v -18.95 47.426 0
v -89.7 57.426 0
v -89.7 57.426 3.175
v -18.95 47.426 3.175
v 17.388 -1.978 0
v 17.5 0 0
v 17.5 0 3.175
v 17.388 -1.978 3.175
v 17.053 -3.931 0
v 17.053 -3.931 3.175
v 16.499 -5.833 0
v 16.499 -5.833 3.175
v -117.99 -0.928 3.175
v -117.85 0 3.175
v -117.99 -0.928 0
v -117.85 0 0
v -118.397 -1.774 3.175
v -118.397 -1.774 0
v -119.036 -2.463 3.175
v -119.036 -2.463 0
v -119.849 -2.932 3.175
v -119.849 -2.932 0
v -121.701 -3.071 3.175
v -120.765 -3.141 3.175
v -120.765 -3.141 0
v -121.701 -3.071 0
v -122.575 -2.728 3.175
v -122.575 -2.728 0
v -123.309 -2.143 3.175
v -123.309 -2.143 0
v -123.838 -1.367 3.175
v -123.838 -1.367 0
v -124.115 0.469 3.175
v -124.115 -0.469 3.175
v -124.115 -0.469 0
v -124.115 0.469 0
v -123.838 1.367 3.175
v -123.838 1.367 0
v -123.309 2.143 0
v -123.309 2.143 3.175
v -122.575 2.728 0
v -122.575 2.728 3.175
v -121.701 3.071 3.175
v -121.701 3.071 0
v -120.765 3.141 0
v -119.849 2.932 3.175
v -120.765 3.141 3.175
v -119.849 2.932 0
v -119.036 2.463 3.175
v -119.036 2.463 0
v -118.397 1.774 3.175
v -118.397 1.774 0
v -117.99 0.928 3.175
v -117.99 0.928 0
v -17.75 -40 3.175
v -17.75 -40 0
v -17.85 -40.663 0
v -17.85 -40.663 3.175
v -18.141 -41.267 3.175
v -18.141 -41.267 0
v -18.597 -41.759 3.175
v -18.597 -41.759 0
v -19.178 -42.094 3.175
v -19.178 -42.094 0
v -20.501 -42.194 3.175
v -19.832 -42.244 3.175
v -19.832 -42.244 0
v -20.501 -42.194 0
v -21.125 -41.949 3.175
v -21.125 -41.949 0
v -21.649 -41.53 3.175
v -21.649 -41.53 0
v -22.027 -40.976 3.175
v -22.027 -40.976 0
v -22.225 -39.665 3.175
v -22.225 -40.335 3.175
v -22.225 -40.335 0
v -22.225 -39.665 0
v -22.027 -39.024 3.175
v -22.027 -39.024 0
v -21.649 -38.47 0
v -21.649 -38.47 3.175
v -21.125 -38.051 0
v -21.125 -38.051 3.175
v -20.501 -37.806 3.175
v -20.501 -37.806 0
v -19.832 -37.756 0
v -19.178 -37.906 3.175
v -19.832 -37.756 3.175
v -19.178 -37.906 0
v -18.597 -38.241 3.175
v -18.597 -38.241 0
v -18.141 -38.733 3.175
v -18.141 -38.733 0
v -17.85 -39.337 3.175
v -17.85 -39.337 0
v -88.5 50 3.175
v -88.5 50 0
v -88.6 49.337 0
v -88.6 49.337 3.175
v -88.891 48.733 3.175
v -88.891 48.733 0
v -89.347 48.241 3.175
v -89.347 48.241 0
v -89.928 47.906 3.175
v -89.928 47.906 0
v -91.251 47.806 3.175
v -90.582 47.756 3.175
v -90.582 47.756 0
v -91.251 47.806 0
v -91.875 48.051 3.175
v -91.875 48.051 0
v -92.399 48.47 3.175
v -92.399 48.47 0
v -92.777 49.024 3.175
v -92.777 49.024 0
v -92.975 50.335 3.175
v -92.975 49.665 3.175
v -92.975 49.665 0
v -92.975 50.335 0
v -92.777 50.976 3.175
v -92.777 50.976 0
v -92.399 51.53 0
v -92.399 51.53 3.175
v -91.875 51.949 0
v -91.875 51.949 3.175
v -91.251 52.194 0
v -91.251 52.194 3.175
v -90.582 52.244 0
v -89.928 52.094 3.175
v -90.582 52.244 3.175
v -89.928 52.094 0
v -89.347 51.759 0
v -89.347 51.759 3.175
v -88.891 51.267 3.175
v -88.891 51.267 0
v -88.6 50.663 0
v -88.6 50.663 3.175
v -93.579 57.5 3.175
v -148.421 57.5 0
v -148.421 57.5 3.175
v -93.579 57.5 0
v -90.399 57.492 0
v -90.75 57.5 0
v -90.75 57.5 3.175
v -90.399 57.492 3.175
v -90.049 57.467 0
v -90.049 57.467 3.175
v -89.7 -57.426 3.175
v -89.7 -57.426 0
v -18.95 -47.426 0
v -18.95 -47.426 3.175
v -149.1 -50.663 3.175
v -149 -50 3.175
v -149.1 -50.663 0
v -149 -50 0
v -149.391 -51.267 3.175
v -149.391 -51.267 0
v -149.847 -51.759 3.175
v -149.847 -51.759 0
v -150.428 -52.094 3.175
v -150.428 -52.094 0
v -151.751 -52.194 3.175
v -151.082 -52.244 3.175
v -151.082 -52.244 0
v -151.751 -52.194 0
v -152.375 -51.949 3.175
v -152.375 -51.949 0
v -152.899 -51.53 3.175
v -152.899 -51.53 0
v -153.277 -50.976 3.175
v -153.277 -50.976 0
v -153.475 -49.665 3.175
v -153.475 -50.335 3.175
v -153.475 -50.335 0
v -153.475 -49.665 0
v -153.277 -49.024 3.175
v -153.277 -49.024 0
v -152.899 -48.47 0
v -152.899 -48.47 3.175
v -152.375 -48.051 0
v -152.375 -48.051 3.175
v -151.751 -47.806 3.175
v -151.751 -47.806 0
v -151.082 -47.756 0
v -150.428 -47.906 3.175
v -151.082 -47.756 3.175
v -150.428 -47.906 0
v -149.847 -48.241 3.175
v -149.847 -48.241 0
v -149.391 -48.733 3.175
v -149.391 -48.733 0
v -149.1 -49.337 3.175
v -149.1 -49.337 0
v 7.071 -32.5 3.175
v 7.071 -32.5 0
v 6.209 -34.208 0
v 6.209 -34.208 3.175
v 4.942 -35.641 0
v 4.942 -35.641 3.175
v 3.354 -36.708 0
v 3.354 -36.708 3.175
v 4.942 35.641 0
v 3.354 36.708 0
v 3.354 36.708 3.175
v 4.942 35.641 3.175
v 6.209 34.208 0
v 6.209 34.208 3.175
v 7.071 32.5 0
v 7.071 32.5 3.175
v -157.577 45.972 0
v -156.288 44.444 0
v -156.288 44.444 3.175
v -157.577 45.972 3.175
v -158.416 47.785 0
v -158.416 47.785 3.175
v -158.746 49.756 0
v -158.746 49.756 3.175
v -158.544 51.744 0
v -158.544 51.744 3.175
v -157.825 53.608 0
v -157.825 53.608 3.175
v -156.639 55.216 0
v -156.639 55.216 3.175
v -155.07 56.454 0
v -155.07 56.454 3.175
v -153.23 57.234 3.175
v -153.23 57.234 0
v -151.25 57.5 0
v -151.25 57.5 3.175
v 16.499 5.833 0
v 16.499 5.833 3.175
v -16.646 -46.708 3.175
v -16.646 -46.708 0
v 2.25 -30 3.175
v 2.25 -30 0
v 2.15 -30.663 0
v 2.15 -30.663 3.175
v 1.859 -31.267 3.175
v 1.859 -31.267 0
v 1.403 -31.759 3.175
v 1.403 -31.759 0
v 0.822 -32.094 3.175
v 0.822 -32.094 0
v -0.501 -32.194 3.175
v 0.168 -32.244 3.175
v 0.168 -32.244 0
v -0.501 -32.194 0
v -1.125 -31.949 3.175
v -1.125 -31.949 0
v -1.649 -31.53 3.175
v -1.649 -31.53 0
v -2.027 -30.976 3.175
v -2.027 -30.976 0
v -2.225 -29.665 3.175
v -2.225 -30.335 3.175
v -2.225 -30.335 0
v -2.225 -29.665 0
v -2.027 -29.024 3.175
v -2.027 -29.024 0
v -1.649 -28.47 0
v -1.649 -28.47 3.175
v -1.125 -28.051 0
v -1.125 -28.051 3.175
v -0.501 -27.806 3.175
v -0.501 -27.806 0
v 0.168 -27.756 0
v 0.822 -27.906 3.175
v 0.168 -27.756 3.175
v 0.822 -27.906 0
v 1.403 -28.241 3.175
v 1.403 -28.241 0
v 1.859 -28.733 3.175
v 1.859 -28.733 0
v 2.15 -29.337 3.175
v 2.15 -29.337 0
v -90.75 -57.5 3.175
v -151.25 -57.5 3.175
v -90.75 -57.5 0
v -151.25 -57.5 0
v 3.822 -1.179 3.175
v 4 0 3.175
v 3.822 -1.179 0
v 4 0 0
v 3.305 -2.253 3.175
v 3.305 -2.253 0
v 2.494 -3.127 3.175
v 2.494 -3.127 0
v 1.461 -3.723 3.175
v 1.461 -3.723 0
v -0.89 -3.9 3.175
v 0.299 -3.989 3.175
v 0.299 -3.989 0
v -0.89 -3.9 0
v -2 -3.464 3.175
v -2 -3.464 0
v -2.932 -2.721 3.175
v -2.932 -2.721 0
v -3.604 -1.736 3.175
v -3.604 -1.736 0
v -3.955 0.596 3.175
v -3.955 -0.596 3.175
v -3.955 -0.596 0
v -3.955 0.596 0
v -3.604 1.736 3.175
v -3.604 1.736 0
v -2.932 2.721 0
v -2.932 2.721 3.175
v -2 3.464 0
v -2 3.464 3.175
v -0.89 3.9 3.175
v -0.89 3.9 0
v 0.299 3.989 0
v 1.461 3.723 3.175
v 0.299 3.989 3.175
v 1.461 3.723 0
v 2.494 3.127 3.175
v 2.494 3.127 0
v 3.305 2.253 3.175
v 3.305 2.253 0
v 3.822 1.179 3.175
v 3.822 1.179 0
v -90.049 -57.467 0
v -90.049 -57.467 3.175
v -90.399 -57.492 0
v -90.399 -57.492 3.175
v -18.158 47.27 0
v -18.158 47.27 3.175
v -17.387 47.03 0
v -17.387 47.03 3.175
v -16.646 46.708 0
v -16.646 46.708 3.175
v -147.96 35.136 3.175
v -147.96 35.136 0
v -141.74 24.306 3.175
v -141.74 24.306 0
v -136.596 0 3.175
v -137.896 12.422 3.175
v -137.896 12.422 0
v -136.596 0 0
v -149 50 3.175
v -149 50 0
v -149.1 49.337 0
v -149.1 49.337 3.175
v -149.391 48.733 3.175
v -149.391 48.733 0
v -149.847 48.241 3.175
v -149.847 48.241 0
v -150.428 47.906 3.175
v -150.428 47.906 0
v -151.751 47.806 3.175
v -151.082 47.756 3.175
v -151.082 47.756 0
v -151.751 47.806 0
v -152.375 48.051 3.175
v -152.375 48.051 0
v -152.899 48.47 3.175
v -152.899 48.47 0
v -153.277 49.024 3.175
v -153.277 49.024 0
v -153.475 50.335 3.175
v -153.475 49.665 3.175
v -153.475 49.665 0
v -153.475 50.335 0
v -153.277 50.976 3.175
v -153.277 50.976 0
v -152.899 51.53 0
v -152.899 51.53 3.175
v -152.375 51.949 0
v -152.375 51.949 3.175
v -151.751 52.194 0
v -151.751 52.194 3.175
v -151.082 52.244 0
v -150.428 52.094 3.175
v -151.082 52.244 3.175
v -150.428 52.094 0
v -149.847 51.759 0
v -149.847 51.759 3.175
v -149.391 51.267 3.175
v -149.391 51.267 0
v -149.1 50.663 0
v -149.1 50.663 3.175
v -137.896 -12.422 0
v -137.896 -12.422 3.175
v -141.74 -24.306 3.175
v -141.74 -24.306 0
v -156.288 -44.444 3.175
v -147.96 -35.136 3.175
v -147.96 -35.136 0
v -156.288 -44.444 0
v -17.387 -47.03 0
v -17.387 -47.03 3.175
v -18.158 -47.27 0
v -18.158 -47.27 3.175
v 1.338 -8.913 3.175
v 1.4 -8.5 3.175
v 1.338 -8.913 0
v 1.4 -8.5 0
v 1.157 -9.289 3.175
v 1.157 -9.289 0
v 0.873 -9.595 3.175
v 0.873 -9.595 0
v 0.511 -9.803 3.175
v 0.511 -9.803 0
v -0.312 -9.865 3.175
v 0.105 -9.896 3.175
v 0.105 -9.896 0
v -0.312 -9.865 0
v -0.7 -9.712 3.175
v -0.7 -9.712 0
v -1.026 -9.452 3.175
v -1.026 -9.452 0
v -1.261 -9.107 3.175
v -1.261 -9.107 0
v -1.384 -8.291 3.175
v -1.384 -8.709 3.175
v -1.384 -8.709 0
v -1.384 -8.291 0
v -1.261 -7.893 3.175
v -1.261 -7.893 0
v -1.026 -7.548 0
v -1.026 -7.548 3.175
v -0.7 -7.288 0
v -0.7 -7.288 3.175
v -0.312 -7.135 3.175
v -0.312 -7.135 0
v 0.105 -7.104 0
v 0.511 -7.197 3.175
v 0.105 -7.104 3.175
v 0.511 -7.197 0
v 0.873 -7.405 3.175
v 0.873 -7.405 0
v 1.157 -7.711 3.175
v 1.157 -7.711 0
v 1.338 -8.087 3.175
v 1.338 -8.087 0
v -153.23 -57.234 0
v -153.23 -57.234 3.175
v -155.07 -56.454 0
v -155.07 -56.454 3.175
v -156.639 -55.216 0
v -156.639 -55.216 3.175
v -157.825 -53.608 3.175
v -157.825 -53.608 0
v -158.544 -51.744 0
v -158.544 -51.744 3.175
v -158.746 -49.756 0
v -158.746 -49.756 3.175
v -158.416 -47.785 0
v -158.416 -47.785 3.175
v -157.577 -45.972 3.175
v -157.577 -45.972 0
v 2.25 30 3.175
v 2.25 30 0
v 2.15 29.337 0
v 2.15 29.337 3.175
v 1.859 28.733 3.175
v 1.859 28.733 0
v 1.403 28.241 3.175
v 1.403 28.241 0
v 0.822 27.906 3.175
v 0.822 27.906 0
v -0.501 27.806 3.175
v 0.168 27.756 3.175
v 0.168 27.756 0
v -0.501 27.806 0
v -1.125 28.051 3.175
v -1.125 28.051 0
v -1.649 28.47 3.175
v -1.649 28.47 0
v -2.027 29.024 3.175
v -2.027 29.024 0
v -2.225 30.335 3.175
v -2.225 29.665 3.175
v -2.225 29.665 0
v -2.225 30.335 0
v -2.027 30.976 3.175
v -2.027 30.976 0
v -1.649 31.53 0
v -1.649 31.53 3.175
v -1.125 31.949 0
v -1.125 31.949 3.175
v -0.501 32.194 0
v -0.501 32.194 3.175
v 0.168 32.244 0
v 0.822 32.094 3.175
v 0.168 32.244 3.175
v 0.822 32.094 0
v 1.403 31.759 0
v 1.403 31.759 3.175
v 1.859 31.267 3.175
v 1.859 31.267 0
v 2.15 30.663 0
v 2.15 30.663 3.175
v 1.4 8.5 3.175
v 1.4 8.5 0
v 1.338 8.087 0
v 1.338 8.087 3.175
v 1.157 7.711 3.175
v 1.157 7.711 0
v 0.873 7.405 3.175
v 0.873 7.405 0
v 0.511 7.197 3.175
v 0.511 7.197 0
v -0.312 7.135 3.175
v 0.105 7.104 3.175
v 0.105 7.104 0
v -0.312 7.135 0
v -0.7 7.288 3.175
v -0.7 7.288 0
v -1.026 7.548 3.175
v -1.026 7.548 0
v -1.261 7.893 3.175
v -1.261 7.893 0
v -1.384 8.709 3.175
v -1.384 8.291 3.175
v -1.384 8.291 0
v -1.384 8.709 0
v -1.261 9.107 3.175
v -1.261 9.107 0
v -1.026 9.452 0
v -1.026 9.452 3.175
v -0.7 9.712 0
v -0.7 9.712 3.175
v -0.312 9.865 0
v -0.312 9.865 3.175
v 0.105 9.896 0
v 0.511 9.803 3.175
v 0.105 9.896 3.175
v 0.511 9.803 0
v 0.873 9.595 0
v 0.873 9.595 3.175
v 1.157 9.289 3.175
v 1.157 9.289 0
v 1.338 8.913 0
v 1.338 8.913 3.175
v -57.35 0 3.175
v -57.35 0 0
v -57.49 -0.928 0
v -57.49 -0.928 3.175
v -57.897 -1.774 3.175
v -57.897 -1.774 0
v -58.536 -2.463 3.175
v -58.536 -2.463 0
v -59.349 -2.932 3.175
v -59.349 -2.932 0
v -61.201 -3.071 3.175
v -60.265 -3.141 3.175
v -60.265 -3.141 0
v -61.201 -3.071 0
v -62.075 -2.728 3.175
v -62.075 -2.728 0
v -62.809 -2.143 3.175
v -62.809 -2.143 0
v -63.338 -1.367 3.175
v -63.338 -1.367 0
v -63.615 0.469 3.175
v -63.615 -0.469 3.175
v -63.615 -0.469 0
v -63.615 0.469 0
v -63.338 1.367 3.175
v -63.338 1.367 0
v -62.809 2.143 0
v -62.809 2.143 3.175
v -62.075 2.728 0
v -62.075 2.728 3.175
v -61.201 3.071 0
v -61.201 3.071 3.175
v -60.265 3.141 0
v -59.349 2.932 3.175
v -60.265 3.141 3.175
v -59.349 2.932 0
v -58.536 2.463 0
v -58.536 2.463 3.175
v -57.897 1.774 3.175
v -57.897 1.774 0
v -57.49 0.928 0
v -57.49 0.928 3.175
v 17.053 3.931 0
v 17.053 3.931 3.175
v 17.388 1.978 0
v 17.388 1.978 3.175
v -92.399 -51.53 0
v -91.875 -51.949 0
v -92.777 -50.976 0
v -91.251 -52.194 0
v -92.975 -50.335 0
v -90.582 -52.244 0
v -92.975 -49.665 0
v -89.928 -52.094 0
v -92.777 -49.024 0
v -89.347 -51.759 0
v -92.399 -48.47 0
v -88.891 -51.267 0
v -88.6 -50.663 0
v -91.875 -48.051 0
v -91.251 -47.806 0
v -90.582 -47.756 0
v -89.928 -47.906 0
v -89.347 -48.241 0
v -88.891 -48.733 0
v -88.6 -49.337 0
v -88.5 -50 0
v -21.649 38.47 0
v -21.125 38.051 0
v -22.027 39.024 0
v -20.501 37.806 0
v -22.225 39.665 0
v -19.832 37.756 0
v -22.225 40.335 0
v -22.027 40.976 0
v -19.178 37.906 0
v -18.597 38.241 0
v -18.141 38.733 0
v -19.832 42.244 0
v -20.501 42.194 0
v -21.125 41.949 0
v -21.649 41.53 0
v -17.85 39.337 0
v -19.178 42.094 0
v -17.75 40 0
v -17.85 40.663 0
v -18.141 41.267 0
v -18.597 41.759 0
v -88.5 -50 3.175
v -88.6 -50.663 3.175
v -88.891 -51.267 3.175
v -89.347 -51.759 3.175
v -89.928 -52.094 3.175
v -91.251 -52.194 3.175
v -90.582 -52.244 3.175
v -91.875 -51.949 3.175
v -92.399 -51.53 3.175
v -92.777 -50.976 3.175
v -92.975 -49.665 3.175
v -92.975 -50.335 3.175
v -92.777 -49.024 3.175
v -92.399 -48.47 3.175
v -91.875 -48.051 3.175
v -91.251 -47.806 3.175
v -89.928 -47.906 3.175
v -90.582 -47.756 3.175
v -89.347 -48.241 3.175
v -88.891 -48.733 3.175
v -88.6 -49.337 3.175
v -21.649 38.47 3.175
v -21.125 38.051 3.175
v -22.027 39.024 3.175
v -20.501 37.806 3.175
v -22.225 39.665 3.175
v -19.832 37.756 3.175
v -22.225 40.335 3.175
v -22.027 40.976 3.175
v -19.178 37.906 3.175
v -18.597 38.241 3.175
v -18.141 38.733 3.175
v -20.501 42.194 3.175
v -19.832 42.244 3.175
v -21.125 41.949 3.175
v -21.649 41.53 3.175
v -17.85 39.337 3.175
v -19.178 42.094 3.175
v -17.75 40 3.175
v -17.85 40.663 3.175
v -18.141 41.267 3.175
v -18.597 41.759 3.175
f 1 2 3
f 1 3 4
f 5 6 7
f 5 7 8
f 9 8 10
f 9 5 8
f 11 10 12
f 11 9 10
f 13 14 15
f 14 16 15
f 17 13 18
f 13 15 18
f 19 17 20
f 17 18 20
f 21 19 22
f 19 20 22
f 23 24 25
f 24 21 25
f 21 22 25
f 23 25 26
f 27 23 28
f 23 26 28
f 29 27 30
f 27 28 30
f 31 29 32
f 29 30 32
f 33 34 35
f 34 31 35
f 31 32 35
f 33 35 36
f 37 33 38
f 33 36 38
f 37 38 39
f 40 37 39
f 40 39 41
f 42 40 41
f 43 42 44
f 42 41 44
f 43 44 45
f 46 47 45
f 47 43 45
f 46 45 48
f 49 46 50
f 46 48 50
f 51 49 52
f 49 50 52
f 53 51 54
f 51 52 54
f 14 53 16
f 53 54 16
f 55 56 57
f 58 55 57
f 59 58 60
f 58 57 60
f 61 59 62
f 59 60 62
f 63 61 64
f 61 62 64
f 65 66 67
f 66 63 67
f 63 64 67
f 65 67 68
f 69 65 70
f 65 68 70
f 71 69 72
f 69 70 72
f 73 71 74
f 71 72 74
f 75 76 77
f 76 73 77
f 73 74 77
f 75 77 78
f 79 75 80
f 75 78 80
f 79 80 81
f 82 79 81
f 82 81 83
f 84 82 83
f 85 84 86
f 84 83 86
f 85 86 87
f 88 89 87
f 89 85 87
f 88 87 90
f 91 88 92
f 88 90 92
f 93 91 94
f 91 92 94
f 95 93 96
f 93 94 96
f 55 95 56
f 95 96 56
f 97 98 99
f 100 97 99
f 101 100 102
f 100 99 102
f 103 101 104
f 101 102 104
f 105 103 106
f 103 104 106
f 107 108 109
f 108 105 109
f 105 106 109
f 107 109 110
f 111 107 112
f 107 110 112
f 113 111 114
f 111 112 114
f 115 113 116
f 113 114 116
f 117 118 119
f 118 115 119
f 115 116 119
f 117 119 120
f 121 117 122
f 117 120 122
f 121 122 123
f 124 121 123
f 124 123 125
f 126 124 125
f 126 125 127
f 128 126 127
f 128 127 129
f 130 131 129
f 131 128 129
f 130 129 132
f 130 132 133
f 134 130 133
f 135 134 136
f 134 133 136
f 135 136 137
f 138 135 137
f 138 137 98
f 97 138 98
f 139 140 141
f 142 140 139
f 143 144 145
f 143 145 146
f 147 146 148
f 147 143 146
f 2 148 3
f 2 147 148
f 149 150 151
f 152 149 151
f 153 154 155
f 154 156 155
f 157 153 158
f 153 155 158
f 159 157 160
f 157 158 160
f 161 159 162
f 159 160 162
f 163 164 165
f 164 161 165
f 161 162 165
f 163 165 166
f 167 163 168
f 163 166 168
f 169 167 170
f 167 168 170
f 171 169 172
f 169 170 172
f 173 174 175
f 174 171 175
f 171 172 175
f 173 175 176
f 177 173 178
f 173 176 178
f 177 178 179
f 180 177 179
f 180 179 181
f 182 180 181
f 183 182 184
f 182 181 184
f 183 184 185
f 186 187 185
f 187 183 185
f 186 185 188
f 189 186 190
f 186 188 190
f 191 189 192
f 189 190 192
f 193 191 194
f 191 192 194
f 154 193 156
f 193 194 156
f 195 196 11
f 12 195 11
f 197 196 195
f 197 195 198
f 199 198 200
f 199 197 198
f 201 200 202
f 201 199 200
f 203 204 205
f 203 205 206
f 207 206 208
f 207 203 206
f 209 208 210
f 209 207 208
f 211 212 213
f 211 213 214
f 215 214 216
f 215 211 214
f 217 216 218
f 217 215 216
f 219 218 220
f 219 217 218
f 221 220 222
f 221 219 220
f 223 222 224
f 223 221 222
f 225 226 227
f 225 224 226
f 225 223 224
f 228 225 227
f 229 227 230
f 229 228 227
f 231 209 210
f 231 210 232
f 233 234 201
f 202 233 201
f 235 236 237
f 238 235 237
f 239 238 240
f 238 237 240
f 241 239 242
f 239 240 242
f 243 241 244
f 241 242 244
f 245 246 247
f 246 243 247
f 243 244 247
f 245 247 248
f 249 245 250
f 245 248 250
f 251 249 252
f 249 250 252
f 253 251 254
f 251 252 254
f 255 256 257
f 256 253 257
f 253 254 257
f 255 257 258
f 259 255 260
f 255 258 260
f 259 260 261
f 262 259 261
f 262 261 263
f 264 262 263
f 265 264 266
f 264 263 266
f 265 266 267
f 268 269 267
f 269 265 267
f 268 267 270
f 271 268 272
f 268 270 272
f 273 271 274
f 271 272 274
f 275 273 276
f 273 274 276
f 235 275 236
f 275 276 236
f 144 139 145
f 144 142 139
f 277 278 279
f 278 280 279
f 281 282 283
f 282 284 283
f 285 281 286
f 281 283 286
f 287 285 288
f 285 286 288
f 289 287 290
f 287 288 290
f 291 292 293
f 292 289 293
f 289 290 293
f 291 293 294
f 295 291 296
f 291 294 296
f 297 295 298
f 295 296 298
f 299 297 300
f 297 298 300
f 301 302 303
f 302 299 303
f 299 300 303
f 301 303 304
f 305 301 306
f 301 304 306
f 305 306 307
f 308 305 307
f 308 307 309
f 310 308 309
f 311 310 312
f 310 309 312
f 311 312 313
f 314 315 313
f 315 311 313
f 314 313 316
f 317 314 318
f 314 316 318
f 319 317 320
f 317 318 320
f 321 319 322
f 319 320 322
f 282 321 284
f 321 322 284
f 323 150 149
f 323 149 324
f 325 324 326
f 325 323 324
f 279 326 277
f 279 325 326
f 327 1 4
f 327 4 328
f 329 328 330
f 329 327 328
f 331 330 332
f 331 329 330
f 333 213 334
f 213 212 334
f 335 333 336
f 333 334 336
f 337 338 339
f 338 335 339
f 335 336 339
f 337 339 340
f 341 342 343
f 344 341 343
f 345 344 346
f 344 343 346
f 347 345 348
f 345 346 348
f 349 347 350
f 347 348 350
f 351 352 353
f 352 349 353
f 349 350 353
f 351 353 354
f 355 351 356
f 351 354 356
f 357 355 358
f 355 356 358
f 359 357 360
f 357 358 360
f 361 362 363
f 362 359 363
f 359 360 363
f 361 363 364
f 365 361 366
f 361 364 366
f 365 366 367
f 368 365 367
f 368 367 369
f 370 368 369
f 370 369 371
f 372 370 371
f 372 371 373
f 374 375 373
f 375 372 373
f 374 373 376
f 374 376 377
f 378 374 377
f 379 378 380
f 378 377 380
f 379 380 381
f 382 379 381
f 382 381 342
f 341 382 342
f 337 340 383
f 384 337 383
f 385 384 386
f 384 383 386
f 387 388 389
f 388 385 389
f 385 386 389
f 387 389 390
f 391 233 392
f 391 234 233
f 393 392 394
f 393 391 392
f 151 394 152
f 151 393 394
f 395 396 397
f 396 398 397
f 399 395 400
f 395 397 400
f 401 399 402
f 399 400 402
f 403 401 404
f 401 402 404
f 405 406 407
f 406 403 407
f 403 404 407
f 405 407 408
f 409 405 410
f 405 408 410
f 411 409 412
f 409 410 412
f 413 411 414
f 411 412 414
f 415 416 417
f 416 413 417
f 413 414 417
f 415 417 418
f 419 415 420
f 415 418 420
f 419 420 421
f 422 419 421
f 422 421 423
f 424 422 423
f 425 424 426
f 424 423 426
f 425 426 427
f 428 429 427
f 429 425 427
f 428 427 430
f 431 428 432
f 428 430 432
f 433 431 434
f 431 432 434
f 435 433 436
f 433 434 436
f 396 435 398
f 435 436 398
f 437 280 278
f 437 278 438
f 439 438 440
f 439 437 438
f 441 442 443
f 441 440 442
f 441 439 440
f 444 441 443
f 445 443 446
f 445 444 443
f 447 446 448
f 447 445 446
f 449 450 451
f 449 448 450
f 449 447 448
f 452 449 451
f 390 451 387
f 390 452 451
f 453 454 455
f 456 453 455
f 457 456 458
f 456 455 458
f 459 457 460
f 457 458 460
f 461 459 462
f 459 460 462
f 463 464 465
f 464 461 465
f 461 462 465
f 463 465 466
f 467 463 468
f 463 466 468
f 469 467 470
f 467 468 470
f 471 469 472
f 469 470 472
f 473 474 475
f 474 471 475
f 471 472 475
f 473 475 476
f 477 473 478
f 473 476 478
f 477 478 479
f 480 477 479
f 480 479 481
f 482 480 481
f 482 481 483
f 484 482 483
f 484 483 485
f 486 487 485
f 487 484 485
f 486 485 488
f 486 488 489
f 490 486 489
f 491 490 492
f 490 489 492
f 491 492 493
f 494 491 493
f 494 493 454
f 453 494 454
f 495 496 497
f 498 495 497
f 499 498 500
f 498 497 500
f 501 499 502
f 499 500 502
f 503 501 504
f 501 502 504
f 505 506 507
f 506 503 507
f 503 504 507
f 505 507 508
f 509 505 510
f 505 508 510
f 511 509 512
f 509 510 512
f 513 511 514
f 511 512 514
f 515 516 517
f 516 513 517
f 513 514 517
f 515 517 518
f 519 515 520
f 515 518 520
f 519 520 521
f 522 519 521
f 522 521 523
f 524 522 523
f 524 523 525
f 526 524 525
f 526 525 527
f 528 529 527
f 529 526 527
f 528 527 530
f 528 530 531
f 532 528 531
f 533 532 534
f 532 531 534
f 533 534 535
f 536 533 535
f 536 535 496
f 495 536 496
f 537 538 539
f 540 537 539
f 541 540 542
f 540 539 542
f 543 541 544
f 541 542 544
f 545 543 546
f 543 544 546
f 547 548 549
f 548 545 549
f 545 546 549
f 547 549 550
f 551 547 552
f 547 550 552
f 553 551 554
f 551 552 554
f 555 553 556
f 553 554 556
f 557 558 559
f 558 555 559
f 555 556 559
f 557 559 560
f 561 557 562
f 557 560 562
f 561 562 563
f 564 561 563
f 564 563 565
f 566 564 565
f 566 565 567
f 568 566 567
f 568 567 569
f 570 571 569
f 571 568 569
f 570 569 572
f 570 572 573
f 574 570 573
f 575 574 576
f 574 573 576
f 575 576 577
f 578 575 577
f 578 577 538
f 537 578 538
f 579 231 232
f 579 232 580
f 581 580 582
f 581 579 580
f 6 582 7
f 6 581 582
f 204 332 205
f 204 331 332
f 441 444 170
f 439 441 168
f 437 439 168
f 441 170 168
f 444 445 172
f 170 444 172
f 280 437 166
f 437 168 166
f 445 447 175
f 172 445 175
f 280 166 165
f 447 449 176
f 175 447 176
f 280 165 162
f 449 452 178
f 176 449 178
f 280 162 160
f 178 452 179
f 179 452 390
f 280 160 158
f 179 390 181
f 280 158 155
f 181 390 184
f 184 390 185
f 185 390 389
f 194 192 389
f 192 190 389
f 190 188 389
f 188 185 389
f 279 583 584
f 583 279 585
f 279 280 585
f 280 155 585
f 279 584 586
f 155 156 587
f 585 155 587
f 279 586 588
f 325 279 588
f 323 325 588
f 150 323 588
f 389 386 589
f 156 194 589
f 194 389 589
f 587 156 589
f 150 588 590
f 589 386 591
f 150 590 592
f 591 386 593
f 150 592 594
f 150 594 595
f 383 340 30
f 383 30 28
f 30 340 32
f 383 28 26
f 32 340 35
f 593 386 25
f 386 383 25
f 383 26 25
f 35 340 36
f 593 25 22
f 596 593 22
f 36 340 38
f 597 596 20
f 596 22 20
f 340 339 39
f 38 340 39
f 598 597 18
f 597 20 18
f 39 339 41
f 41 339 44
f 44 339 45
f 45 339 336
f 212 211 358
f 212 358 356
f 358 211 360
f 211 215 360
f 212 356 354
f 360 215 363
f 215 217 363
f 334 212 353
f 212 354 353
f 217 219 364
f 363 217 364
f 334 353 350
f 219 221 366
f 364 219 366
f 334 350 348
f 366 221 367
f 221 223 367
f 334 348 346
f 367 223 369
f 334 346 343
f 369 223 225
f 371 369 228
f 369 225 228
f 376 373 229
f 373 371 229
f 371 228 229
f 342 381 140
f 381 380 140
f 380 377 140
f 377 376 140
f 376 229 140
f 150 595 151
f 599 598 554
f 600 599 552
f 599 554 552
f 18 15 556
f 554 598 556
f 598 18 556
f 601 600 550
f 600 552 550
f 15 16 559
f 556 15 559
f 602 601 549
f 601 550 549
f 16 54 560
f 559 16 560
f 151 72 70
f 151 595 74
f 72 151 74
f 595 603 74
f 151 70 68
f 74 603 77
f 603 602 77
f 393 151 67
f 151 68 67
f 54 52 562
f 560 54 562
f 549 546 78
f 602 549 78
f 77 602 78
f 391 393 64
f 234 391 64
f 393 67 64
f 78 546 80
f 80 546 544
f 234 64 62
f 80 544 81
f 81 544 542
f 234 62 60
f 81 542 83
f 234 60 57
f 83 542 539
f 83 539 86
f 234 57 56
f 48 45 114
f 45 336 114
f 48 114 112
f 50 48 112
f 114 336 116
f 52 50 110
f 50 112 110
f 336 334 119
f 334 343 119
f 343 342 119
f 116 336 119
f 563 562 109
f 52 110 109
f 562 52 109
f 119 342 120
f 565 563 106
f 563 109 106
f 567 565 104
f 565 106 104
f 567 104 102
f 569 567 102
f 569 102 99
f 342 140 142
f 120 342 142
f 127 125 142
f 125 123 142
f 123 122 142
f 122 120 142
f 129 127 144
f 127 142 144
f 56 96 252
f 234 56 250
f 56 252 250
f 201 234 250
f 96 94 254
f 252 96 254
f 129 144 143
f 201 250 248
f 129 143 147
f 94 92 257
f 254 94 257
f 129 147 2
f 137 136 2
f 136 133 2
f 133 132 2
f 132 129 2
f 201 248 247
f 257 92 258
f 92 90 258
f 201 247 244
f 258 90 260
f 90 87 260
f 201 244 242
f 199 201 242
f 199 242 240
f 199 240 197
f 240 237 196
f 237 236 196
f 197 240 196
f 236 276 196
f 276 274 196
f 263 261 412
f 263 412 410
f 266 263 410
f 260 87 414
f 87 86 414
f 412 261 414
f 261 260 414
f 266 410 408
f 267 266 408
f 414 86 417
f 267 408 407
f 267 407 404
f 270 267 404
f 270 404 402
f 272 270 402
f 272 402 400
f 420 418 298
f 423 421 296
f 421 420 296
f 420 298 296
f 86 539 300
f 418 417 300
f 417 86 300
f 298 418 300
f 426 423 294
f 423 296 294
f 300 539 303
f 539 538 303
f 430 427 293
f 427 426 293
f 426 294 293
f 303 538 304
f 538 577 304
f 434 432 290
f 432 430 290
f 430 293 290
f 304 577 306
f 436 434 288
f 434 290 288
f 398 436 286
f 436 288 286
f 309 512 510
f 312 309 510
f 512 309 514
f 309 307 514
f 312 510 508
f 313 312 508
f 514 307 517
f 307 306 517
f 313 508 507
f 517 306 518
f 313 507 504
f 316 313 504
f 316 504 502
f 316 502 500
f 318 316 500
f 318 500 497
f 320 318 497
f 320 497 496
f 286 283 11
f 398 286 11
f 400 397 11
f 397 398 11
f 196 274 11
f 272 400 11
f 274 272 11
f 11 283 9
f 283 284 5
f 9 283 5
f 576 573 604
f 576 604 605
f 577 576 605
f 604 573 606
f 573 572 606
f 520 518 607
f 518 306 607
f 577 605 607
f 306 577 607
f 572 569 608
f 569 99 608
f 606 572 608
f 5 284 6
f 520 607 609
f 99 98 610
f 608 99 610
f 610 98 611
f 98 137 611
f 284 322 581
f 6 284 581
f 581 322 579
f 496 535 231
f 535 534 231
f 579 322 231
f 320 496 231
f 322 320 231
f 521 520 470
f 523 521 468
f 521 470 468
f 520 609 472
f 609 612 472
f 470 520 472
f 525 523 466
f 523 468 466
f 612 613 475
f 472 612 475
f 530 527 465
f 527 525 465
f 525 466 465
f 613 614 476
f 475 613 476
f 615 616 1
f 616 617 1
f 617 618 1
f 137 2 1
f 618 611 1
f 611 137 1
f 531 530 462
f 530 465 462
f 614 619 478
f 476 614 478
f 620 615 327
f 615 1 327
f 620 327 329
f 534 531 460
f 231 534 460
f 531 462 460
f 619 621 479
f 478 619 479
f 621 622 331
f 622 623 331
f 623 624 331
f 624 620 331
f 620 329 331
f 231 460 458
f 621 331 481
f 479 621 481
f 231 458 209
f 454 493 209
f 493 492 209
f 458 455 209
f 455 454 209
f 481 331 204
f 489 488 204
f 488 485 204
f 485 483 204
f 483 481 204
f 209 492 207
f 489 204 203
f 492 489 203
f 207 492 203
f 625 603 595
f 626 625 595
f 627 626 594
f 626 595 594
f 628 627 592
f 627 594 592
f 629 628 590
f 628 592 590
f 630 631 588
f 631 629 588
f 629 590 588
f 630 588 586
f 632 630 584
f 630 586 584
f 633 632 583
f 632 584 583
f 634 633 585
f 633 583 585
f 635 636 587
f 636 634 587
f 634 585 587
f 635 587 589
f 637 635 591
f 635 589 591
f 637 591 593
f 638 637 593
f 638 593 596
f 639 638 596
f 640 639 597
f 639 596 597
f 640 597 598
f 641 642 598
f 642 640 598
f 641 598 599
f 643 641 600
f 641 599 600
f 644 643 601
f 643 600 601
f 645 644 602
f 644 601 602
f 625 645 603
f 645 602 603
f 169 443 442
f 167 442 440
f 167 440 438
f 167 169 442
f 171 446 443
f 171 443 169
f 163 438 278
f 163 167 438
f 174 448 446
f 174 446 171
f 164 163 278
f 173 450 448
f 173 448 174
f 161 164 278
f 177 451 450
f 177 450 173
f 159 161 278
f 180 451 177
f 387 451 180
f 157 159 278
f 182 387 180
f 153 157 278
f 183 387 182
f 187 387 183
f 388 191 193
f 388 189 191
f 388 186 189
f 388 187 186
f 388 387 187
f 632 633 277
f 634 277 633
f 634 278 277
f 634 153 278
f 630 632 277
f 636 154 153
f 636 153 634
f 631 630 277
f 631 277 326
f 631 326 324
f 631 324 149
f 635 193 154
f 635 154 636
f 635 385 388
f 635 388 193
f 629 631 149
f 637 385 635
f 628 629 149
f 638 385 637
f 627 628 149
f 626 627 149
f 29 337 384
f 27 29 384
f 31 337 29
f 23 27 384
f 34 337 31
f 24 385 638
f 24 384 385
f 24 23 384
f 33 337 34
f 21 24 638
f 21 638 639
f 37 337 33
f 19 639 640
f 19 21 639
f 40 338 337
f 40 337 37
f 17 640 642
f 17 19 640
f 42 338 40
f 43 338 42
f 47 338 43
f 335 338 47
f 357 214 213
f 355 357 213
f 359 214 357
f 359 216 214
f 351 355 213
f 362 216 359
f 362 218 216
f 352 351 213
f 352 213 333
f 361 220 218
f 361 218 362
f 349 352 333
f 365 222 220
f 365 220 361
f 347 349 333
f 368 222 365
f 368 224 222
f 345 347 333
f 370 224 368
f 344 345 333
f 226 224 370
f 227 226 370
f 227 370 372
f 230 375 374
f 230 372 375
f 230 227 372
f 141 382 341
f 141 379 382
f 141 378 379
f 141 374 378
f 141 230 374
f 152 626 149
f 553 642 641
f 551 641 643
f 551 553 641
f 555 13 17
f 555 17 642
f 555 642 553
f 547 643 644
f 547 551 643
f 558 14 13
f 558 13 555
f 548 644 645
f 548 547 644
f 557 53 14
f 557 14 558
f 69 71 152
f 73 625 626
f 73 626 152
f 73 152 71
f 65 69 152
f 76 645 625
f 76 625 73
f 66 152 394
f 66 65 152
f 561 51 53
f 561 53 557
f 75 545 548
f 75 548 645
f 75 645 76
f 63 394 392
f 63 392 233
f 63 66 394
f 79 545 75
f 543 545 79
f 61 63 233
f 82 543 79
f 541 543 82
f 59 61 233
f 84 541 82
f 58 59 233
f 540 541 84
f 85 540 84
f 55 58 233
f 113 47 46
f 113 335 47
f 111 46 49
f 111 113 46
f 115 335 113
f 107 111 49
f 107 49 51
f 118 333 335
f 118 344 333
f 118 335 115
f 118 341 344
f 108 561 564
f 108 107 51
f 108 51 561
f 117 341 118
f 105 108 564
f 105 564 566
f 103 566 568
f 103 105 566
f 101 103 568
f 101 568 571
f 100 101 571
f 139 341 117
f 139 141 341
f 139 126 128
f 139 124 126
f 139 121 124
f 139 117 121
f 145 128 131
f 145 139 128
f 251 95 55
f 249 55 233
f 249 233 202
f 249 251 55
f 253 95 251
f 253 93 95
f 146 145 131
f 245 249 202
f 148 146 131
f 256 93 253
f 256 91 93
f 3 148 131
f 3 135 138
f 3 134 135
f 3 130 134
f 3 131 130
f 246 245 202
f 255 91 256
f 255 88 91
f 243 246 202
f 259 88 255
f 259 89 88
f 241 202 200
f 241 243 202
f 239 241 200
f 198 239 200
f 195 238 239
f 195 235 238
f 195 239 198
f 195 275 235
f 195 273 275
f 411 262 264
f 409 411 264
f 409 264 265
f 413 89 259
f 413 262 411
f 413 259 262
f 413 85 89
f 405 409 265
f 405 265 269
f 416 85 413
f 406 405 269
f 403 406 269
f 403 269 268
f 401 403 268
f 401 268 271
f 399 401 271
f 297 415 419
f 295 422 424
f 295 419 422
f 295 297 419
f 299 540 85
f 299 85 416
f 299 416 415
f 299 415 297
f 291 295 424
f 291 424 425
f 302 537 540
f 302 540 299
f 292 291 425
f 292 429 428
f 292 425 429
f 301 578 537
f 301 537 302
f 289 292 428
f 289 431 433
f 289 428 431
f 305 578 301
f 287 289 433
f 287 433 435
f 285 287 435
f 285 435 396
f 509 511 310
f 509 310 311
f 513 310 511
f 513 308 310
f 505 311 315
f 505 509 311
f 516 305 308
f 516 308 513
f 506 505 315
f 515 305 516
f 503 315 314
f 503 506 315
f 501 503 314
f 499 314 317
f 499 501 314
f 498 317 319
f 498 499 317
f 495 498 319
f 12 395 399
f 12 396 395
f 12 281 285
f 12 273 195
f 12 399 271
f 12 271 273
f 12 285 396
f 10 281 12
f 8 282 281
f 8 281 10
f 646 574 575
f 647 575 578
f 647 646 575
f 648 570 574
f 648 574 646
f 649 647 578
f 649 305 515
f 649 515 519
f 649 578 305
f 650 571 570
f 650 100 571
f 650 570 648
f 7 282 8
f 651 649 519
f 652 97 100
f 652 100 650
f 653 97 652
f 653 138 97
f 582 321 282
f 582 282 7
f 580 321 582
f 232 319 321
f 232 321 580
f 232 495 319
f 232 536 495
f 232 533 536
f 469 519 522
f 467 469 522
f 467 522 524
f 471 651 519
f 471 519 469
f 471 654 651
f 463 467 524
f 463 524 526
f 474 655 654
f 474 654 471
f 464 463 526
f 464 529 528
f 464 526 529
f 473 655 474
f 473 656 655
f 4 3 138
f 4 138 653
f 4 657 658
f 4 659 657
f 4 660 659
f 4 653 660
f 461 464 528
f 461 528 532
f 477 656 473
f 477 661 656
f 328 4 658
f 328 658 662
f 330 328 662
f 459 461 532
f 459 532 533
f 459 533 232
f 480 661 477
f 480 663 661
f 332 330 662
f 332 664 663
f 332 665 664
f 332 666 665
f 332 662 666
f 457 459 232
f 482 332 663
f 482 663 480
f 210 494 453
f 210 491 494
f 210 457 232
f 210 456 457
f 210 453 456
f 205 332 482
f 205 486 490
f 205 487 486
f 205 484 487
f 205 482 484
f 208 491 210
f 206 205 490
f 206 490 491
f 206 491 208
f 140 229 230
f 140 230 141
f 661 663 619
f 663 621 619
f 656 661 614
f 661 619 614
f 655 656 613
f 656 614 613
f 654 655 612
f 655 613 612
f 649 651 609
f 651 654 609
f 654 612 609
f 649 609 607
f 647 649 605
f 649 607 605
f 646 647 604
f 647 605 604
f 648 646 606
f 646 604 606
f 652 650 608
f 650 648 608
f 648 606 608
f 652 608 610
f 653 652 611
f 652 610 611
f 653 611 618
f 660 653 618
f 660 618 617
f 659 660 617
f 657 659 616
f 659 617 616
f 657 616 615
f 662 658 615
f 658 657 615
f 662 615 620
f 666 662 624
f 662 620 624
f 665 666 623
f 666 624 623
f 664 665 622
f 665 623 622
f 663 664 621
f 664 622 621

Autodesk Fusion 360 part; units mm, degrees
sketch "Sketch1" plane through (0, 0, 0) normal (0, 0, 1) x (1, 0, 0)
  circle A0 centre (0, 0) radius 4
  line L0 (0, 0) -> (-60.5, 0) construction
  line L1 (-60.5, 0) -> (-121, 0) construction
  circle A1 centre (-60.5, 0) radius 3.15
  circle A2 centre (-121, 0) radius 3.15
  circle A3 centre (-60.5, 0) radius 47 construction
  circle A4 centre (-121, 0) radius 47 construction
  circle A5 centre (0, 0) radius 17.5
  circle A6 centre (-60.5, 0) radius 17 construction
  circle A7 centre (0, 0) radius 12.5 construction
  circle A8 centre (0, 30) radius 2.25
  circle A9 centre (0, -30) radius 2.25
  circle A10 centre (0, 30) radius 6 construction
  circle A11 centre (0, -30) radius 6 construction
  line L2 (-90.75, 0) -> (-90.75, 50) construction
  circle A12 centre (-90.75, 50) radius 7.5
  circle A13 centre (-90.75, 50) radius 2.25
  line L3 (-90.75, 0) -> (-90.75, -50) construction
  circle A14 centre (-90.75, -50) radius 7.5
  circle A15 centre (-90.75, -50) radius 2.25
  line L4 (-121, 0) -> (-151.25, 0) construction
  line L5 (-151.25, 0) -> (-151.25, 50) construction
  circle A16 centre (-151.25, 50) radius 7.5
  circle A17 centre (-151.25, 50) radius 2.25
  line L6 (-151.25, 0) -> (-151.25, -50) construction
  circle A18 centre (-151.25, -50) radius 7.5
  circle A19 centre (-151.25, -50) radius 2.25
  circle A20 centre (-20, 40) radius 7.5
  line L7 (-20, 40) -> (-20, 0) construction
  line L8 (-20, 0) -> (-20, -40) construction
  circle A21 centre (-20, -40) radius 7.5
  circle A22 centre (-20, -40) radius 2.25
  circle A23 centre (-20, 40) radius 2.25
  line L9 (-89.7004, -57.4262) -> (-18.9504, -47.4262)
  circle A24 centre (0, -30) radius 7.5
  circle A25 centre (0, 30) radius 7.5
  line L10 (-89.7004, 57.4262) -> (-18.9504, 47.4262)
  circle A26 centre (-196.5959, 0) radius 60
  line L11 (-16.6459, 46.7082) -> (3.3541, 36.7082)
  line L12 (7.0711, 32.5) -> (16.4992, 5.8333)
  line L13 (7.0711, -32.5) -> (16.4992, -5.8333)
  line L14 (-16.6459, -46.7082) -> (3.3541, -36.7082)
  circle A27 centre (-121, 86.6222) radius 40
  line L15 (-151.25, -57.5) -> (-90.75, -57.5)
  line L16 (-160.1233, -61.9813) -> (16.4992, -61.9813) construction
  circle A28 centre (0, 0) radius 8.5 construction
  circle A29 centre (0, 8.5) radius 1.4
  circle A30 centre (0, -8.5) radius 1.4
  line L17 (-151.25, 57.5) -> (-90.75, 57.5)
  dimension "d1" = 8
  dimension "d2" = 60.5
  dimension "d4" = 60.5
  dimension "d6" = 6.3
  dimension "d7" = 6.3
  dimension "d8" = 94
  dimension "d9" = 94
  dimension "d10" = 35
  dimension "d11" = 34
  dimension "d12" = 25
  dimension "d13" = 4.5
  dimension "d14" = 4.5
  dimension "d15" = 60
  dimension "d16" = 12
  dimension "d17" = 12
  dimension "d18" = 15
  dimension "d19" = 50
  dimension "d20" = 4.5
  dimension "d21" = 15
  dimension "d22" = 4.5
  dimension "d23" = 30.25
  dimension "d24" = 15
  dimension "d25" = 4.5
  dimension "d26" = 15
  dimension "d27" = 4.5
  dimension "d28" = 15
  dimension "d29" = 40
  dimension "d30" = 20
  dimension "d31" = 15
  dimension "d32" = 4.5
  dimension "d33" = 4.5
  dimension "d34" = 15
  dimension "d35" = 15
  dimension "d36" = 120
  dimension "d37" = 80
  dimension "d44" = 17
  dimension "d45" = 2.8
  dimension "d46" = 2.8
extrude "Extrude1" add sketch "Sketch1" along normal blind 3.175 contours A5 | A5 A12 A14 A16 A18 A20 A21 L9 A24 A25 L10 A26 L11 L12 L13 L14 A27 L15 | A25 | A24 | A20 | A21 | A12 | A14 | A12 A27 L17 | A27 L17 | A18 | A16 | A16 A27 L17 picked at (-127.9955, 54.7116)
ref_plane "WorkPlane1" through (-70.7689, 0, 3.175) normal (0, 0, 1) x (1, 0, 0)
sketch "Sketch2" plane through (0, 0, 3.175) normal (0, 0, 1) x (1, 0, 0)
  circle A0 centre (-90.75, -50) radius 2.25
  circle A1 centre (0, 30) radius 2.25
  circle A2 centre (-151.25, -50) radius 2.25
  circle A3 centre (0, -30) radius 2.25
  circle A4 centre (0, 0) radius 4
  circle A5 centre (0, 8.5) radius 1.4
  circle A6 centre (0, -8.5) radius 1.4
  circle A7 centre (-20, -40) radius 2.25
  circle A8 centre (-90.75, 50) radius 2.25
  circle A9 centre (-20, 40) radius 2.25
  circle A10 centre (-151.25, 50) radius 2.25
  circle A11 centre (-60.5, 0) radius 3.15
  circle A12 centre (-121, 0) radius 3.15
  line L0 (-151.25, -57.5) -> (-90.75, -57.5)
  arc A13 (-156.2884, -44.4444) -> (-151.25, -57.5) centre (-151.25, -50) ccw
  arc A14 (-156.2884, -44.4444) -> (-156.2884, 44.4444) centre (-196.5959, 0) ccw
  arc A15 (-151.25, 57.5) -> (-156.2884, 44.4444) centre (-151.25, 50) ccw
  line L1 (-151.25, 57.5) -> (-90.75, 57.5)
  arc A16 (-89.7004, 57.4262) -> (-90.75, 57.5) centre (-90.75, 50) ccw
  line L2 (-89.7004, 57.4262) -> (-18.9504, 47.4262)
  arc A17 (-16.6459, 46.7082) -> (-18.9504, 47.4262) centre (-20, 40) ccw
  line L3 (-16.6459, 46.7082) -> (3.3541, 36.7082)
  arc A18 (7.0711, 32.5) -> (3.3541, 36.7082) centre (0, 30) ccw
  line L4 (7.0711, 32.5) -> (16.4992, 5.8333)
  arc A19 (16.4992, -5.8333) -> (16.4992, 5.8333) centre (0, 0) ccw
  line L5 (7.0711, -32.5) -> (16.4992, -5.8333)
  arc A20 (3.3541, -36.7082) -> (7.0711, -32.5) centre (0, -30) ccw
  line L6 (-16.6459, -46.7082) -> (3.3541, -36.7082)
  arc A21 (-18.9504, -47.4262) -> (-16.6459, -46.7082) centre (-20, -40) ccw
  line L7 (-89.7004, -57.4262) -> (-18.9504, -47.4262)
  arc A22 (-90.75, -57.5) -> (-89.7004, -57.4262) centre (-90.75, -50) ccw
equation "d2 = distBetweenGears"
equation "distBetweenGears = 60.5 mm"
equation "d4 = distBetweenGears"
equation "acrylicRoundHoleSize = 6.3 mm"
equation "d6 = acrylicRoundHoleSize"
equation "d7 = acrylicRoundHoleSize"
equation "d13 = WoodScrewHoleSize"
equation "d14 = WoodScrewHoleSize"
equation "d20 = WoodScrewHoleSize"
equation "d22 = WoodScrewHoleSize"
equation "d23 = distBetweenGears / 2"
equation "d25 = WoodScrewHoleSize"
equation "d27 = WoodScrewHoleSize"
equation "d32 = WoodScrewHoleSize"
equation "d33 = WoodScrewHoleSize"
equation "WoodScrewHoleSize = 4.5 mm"
